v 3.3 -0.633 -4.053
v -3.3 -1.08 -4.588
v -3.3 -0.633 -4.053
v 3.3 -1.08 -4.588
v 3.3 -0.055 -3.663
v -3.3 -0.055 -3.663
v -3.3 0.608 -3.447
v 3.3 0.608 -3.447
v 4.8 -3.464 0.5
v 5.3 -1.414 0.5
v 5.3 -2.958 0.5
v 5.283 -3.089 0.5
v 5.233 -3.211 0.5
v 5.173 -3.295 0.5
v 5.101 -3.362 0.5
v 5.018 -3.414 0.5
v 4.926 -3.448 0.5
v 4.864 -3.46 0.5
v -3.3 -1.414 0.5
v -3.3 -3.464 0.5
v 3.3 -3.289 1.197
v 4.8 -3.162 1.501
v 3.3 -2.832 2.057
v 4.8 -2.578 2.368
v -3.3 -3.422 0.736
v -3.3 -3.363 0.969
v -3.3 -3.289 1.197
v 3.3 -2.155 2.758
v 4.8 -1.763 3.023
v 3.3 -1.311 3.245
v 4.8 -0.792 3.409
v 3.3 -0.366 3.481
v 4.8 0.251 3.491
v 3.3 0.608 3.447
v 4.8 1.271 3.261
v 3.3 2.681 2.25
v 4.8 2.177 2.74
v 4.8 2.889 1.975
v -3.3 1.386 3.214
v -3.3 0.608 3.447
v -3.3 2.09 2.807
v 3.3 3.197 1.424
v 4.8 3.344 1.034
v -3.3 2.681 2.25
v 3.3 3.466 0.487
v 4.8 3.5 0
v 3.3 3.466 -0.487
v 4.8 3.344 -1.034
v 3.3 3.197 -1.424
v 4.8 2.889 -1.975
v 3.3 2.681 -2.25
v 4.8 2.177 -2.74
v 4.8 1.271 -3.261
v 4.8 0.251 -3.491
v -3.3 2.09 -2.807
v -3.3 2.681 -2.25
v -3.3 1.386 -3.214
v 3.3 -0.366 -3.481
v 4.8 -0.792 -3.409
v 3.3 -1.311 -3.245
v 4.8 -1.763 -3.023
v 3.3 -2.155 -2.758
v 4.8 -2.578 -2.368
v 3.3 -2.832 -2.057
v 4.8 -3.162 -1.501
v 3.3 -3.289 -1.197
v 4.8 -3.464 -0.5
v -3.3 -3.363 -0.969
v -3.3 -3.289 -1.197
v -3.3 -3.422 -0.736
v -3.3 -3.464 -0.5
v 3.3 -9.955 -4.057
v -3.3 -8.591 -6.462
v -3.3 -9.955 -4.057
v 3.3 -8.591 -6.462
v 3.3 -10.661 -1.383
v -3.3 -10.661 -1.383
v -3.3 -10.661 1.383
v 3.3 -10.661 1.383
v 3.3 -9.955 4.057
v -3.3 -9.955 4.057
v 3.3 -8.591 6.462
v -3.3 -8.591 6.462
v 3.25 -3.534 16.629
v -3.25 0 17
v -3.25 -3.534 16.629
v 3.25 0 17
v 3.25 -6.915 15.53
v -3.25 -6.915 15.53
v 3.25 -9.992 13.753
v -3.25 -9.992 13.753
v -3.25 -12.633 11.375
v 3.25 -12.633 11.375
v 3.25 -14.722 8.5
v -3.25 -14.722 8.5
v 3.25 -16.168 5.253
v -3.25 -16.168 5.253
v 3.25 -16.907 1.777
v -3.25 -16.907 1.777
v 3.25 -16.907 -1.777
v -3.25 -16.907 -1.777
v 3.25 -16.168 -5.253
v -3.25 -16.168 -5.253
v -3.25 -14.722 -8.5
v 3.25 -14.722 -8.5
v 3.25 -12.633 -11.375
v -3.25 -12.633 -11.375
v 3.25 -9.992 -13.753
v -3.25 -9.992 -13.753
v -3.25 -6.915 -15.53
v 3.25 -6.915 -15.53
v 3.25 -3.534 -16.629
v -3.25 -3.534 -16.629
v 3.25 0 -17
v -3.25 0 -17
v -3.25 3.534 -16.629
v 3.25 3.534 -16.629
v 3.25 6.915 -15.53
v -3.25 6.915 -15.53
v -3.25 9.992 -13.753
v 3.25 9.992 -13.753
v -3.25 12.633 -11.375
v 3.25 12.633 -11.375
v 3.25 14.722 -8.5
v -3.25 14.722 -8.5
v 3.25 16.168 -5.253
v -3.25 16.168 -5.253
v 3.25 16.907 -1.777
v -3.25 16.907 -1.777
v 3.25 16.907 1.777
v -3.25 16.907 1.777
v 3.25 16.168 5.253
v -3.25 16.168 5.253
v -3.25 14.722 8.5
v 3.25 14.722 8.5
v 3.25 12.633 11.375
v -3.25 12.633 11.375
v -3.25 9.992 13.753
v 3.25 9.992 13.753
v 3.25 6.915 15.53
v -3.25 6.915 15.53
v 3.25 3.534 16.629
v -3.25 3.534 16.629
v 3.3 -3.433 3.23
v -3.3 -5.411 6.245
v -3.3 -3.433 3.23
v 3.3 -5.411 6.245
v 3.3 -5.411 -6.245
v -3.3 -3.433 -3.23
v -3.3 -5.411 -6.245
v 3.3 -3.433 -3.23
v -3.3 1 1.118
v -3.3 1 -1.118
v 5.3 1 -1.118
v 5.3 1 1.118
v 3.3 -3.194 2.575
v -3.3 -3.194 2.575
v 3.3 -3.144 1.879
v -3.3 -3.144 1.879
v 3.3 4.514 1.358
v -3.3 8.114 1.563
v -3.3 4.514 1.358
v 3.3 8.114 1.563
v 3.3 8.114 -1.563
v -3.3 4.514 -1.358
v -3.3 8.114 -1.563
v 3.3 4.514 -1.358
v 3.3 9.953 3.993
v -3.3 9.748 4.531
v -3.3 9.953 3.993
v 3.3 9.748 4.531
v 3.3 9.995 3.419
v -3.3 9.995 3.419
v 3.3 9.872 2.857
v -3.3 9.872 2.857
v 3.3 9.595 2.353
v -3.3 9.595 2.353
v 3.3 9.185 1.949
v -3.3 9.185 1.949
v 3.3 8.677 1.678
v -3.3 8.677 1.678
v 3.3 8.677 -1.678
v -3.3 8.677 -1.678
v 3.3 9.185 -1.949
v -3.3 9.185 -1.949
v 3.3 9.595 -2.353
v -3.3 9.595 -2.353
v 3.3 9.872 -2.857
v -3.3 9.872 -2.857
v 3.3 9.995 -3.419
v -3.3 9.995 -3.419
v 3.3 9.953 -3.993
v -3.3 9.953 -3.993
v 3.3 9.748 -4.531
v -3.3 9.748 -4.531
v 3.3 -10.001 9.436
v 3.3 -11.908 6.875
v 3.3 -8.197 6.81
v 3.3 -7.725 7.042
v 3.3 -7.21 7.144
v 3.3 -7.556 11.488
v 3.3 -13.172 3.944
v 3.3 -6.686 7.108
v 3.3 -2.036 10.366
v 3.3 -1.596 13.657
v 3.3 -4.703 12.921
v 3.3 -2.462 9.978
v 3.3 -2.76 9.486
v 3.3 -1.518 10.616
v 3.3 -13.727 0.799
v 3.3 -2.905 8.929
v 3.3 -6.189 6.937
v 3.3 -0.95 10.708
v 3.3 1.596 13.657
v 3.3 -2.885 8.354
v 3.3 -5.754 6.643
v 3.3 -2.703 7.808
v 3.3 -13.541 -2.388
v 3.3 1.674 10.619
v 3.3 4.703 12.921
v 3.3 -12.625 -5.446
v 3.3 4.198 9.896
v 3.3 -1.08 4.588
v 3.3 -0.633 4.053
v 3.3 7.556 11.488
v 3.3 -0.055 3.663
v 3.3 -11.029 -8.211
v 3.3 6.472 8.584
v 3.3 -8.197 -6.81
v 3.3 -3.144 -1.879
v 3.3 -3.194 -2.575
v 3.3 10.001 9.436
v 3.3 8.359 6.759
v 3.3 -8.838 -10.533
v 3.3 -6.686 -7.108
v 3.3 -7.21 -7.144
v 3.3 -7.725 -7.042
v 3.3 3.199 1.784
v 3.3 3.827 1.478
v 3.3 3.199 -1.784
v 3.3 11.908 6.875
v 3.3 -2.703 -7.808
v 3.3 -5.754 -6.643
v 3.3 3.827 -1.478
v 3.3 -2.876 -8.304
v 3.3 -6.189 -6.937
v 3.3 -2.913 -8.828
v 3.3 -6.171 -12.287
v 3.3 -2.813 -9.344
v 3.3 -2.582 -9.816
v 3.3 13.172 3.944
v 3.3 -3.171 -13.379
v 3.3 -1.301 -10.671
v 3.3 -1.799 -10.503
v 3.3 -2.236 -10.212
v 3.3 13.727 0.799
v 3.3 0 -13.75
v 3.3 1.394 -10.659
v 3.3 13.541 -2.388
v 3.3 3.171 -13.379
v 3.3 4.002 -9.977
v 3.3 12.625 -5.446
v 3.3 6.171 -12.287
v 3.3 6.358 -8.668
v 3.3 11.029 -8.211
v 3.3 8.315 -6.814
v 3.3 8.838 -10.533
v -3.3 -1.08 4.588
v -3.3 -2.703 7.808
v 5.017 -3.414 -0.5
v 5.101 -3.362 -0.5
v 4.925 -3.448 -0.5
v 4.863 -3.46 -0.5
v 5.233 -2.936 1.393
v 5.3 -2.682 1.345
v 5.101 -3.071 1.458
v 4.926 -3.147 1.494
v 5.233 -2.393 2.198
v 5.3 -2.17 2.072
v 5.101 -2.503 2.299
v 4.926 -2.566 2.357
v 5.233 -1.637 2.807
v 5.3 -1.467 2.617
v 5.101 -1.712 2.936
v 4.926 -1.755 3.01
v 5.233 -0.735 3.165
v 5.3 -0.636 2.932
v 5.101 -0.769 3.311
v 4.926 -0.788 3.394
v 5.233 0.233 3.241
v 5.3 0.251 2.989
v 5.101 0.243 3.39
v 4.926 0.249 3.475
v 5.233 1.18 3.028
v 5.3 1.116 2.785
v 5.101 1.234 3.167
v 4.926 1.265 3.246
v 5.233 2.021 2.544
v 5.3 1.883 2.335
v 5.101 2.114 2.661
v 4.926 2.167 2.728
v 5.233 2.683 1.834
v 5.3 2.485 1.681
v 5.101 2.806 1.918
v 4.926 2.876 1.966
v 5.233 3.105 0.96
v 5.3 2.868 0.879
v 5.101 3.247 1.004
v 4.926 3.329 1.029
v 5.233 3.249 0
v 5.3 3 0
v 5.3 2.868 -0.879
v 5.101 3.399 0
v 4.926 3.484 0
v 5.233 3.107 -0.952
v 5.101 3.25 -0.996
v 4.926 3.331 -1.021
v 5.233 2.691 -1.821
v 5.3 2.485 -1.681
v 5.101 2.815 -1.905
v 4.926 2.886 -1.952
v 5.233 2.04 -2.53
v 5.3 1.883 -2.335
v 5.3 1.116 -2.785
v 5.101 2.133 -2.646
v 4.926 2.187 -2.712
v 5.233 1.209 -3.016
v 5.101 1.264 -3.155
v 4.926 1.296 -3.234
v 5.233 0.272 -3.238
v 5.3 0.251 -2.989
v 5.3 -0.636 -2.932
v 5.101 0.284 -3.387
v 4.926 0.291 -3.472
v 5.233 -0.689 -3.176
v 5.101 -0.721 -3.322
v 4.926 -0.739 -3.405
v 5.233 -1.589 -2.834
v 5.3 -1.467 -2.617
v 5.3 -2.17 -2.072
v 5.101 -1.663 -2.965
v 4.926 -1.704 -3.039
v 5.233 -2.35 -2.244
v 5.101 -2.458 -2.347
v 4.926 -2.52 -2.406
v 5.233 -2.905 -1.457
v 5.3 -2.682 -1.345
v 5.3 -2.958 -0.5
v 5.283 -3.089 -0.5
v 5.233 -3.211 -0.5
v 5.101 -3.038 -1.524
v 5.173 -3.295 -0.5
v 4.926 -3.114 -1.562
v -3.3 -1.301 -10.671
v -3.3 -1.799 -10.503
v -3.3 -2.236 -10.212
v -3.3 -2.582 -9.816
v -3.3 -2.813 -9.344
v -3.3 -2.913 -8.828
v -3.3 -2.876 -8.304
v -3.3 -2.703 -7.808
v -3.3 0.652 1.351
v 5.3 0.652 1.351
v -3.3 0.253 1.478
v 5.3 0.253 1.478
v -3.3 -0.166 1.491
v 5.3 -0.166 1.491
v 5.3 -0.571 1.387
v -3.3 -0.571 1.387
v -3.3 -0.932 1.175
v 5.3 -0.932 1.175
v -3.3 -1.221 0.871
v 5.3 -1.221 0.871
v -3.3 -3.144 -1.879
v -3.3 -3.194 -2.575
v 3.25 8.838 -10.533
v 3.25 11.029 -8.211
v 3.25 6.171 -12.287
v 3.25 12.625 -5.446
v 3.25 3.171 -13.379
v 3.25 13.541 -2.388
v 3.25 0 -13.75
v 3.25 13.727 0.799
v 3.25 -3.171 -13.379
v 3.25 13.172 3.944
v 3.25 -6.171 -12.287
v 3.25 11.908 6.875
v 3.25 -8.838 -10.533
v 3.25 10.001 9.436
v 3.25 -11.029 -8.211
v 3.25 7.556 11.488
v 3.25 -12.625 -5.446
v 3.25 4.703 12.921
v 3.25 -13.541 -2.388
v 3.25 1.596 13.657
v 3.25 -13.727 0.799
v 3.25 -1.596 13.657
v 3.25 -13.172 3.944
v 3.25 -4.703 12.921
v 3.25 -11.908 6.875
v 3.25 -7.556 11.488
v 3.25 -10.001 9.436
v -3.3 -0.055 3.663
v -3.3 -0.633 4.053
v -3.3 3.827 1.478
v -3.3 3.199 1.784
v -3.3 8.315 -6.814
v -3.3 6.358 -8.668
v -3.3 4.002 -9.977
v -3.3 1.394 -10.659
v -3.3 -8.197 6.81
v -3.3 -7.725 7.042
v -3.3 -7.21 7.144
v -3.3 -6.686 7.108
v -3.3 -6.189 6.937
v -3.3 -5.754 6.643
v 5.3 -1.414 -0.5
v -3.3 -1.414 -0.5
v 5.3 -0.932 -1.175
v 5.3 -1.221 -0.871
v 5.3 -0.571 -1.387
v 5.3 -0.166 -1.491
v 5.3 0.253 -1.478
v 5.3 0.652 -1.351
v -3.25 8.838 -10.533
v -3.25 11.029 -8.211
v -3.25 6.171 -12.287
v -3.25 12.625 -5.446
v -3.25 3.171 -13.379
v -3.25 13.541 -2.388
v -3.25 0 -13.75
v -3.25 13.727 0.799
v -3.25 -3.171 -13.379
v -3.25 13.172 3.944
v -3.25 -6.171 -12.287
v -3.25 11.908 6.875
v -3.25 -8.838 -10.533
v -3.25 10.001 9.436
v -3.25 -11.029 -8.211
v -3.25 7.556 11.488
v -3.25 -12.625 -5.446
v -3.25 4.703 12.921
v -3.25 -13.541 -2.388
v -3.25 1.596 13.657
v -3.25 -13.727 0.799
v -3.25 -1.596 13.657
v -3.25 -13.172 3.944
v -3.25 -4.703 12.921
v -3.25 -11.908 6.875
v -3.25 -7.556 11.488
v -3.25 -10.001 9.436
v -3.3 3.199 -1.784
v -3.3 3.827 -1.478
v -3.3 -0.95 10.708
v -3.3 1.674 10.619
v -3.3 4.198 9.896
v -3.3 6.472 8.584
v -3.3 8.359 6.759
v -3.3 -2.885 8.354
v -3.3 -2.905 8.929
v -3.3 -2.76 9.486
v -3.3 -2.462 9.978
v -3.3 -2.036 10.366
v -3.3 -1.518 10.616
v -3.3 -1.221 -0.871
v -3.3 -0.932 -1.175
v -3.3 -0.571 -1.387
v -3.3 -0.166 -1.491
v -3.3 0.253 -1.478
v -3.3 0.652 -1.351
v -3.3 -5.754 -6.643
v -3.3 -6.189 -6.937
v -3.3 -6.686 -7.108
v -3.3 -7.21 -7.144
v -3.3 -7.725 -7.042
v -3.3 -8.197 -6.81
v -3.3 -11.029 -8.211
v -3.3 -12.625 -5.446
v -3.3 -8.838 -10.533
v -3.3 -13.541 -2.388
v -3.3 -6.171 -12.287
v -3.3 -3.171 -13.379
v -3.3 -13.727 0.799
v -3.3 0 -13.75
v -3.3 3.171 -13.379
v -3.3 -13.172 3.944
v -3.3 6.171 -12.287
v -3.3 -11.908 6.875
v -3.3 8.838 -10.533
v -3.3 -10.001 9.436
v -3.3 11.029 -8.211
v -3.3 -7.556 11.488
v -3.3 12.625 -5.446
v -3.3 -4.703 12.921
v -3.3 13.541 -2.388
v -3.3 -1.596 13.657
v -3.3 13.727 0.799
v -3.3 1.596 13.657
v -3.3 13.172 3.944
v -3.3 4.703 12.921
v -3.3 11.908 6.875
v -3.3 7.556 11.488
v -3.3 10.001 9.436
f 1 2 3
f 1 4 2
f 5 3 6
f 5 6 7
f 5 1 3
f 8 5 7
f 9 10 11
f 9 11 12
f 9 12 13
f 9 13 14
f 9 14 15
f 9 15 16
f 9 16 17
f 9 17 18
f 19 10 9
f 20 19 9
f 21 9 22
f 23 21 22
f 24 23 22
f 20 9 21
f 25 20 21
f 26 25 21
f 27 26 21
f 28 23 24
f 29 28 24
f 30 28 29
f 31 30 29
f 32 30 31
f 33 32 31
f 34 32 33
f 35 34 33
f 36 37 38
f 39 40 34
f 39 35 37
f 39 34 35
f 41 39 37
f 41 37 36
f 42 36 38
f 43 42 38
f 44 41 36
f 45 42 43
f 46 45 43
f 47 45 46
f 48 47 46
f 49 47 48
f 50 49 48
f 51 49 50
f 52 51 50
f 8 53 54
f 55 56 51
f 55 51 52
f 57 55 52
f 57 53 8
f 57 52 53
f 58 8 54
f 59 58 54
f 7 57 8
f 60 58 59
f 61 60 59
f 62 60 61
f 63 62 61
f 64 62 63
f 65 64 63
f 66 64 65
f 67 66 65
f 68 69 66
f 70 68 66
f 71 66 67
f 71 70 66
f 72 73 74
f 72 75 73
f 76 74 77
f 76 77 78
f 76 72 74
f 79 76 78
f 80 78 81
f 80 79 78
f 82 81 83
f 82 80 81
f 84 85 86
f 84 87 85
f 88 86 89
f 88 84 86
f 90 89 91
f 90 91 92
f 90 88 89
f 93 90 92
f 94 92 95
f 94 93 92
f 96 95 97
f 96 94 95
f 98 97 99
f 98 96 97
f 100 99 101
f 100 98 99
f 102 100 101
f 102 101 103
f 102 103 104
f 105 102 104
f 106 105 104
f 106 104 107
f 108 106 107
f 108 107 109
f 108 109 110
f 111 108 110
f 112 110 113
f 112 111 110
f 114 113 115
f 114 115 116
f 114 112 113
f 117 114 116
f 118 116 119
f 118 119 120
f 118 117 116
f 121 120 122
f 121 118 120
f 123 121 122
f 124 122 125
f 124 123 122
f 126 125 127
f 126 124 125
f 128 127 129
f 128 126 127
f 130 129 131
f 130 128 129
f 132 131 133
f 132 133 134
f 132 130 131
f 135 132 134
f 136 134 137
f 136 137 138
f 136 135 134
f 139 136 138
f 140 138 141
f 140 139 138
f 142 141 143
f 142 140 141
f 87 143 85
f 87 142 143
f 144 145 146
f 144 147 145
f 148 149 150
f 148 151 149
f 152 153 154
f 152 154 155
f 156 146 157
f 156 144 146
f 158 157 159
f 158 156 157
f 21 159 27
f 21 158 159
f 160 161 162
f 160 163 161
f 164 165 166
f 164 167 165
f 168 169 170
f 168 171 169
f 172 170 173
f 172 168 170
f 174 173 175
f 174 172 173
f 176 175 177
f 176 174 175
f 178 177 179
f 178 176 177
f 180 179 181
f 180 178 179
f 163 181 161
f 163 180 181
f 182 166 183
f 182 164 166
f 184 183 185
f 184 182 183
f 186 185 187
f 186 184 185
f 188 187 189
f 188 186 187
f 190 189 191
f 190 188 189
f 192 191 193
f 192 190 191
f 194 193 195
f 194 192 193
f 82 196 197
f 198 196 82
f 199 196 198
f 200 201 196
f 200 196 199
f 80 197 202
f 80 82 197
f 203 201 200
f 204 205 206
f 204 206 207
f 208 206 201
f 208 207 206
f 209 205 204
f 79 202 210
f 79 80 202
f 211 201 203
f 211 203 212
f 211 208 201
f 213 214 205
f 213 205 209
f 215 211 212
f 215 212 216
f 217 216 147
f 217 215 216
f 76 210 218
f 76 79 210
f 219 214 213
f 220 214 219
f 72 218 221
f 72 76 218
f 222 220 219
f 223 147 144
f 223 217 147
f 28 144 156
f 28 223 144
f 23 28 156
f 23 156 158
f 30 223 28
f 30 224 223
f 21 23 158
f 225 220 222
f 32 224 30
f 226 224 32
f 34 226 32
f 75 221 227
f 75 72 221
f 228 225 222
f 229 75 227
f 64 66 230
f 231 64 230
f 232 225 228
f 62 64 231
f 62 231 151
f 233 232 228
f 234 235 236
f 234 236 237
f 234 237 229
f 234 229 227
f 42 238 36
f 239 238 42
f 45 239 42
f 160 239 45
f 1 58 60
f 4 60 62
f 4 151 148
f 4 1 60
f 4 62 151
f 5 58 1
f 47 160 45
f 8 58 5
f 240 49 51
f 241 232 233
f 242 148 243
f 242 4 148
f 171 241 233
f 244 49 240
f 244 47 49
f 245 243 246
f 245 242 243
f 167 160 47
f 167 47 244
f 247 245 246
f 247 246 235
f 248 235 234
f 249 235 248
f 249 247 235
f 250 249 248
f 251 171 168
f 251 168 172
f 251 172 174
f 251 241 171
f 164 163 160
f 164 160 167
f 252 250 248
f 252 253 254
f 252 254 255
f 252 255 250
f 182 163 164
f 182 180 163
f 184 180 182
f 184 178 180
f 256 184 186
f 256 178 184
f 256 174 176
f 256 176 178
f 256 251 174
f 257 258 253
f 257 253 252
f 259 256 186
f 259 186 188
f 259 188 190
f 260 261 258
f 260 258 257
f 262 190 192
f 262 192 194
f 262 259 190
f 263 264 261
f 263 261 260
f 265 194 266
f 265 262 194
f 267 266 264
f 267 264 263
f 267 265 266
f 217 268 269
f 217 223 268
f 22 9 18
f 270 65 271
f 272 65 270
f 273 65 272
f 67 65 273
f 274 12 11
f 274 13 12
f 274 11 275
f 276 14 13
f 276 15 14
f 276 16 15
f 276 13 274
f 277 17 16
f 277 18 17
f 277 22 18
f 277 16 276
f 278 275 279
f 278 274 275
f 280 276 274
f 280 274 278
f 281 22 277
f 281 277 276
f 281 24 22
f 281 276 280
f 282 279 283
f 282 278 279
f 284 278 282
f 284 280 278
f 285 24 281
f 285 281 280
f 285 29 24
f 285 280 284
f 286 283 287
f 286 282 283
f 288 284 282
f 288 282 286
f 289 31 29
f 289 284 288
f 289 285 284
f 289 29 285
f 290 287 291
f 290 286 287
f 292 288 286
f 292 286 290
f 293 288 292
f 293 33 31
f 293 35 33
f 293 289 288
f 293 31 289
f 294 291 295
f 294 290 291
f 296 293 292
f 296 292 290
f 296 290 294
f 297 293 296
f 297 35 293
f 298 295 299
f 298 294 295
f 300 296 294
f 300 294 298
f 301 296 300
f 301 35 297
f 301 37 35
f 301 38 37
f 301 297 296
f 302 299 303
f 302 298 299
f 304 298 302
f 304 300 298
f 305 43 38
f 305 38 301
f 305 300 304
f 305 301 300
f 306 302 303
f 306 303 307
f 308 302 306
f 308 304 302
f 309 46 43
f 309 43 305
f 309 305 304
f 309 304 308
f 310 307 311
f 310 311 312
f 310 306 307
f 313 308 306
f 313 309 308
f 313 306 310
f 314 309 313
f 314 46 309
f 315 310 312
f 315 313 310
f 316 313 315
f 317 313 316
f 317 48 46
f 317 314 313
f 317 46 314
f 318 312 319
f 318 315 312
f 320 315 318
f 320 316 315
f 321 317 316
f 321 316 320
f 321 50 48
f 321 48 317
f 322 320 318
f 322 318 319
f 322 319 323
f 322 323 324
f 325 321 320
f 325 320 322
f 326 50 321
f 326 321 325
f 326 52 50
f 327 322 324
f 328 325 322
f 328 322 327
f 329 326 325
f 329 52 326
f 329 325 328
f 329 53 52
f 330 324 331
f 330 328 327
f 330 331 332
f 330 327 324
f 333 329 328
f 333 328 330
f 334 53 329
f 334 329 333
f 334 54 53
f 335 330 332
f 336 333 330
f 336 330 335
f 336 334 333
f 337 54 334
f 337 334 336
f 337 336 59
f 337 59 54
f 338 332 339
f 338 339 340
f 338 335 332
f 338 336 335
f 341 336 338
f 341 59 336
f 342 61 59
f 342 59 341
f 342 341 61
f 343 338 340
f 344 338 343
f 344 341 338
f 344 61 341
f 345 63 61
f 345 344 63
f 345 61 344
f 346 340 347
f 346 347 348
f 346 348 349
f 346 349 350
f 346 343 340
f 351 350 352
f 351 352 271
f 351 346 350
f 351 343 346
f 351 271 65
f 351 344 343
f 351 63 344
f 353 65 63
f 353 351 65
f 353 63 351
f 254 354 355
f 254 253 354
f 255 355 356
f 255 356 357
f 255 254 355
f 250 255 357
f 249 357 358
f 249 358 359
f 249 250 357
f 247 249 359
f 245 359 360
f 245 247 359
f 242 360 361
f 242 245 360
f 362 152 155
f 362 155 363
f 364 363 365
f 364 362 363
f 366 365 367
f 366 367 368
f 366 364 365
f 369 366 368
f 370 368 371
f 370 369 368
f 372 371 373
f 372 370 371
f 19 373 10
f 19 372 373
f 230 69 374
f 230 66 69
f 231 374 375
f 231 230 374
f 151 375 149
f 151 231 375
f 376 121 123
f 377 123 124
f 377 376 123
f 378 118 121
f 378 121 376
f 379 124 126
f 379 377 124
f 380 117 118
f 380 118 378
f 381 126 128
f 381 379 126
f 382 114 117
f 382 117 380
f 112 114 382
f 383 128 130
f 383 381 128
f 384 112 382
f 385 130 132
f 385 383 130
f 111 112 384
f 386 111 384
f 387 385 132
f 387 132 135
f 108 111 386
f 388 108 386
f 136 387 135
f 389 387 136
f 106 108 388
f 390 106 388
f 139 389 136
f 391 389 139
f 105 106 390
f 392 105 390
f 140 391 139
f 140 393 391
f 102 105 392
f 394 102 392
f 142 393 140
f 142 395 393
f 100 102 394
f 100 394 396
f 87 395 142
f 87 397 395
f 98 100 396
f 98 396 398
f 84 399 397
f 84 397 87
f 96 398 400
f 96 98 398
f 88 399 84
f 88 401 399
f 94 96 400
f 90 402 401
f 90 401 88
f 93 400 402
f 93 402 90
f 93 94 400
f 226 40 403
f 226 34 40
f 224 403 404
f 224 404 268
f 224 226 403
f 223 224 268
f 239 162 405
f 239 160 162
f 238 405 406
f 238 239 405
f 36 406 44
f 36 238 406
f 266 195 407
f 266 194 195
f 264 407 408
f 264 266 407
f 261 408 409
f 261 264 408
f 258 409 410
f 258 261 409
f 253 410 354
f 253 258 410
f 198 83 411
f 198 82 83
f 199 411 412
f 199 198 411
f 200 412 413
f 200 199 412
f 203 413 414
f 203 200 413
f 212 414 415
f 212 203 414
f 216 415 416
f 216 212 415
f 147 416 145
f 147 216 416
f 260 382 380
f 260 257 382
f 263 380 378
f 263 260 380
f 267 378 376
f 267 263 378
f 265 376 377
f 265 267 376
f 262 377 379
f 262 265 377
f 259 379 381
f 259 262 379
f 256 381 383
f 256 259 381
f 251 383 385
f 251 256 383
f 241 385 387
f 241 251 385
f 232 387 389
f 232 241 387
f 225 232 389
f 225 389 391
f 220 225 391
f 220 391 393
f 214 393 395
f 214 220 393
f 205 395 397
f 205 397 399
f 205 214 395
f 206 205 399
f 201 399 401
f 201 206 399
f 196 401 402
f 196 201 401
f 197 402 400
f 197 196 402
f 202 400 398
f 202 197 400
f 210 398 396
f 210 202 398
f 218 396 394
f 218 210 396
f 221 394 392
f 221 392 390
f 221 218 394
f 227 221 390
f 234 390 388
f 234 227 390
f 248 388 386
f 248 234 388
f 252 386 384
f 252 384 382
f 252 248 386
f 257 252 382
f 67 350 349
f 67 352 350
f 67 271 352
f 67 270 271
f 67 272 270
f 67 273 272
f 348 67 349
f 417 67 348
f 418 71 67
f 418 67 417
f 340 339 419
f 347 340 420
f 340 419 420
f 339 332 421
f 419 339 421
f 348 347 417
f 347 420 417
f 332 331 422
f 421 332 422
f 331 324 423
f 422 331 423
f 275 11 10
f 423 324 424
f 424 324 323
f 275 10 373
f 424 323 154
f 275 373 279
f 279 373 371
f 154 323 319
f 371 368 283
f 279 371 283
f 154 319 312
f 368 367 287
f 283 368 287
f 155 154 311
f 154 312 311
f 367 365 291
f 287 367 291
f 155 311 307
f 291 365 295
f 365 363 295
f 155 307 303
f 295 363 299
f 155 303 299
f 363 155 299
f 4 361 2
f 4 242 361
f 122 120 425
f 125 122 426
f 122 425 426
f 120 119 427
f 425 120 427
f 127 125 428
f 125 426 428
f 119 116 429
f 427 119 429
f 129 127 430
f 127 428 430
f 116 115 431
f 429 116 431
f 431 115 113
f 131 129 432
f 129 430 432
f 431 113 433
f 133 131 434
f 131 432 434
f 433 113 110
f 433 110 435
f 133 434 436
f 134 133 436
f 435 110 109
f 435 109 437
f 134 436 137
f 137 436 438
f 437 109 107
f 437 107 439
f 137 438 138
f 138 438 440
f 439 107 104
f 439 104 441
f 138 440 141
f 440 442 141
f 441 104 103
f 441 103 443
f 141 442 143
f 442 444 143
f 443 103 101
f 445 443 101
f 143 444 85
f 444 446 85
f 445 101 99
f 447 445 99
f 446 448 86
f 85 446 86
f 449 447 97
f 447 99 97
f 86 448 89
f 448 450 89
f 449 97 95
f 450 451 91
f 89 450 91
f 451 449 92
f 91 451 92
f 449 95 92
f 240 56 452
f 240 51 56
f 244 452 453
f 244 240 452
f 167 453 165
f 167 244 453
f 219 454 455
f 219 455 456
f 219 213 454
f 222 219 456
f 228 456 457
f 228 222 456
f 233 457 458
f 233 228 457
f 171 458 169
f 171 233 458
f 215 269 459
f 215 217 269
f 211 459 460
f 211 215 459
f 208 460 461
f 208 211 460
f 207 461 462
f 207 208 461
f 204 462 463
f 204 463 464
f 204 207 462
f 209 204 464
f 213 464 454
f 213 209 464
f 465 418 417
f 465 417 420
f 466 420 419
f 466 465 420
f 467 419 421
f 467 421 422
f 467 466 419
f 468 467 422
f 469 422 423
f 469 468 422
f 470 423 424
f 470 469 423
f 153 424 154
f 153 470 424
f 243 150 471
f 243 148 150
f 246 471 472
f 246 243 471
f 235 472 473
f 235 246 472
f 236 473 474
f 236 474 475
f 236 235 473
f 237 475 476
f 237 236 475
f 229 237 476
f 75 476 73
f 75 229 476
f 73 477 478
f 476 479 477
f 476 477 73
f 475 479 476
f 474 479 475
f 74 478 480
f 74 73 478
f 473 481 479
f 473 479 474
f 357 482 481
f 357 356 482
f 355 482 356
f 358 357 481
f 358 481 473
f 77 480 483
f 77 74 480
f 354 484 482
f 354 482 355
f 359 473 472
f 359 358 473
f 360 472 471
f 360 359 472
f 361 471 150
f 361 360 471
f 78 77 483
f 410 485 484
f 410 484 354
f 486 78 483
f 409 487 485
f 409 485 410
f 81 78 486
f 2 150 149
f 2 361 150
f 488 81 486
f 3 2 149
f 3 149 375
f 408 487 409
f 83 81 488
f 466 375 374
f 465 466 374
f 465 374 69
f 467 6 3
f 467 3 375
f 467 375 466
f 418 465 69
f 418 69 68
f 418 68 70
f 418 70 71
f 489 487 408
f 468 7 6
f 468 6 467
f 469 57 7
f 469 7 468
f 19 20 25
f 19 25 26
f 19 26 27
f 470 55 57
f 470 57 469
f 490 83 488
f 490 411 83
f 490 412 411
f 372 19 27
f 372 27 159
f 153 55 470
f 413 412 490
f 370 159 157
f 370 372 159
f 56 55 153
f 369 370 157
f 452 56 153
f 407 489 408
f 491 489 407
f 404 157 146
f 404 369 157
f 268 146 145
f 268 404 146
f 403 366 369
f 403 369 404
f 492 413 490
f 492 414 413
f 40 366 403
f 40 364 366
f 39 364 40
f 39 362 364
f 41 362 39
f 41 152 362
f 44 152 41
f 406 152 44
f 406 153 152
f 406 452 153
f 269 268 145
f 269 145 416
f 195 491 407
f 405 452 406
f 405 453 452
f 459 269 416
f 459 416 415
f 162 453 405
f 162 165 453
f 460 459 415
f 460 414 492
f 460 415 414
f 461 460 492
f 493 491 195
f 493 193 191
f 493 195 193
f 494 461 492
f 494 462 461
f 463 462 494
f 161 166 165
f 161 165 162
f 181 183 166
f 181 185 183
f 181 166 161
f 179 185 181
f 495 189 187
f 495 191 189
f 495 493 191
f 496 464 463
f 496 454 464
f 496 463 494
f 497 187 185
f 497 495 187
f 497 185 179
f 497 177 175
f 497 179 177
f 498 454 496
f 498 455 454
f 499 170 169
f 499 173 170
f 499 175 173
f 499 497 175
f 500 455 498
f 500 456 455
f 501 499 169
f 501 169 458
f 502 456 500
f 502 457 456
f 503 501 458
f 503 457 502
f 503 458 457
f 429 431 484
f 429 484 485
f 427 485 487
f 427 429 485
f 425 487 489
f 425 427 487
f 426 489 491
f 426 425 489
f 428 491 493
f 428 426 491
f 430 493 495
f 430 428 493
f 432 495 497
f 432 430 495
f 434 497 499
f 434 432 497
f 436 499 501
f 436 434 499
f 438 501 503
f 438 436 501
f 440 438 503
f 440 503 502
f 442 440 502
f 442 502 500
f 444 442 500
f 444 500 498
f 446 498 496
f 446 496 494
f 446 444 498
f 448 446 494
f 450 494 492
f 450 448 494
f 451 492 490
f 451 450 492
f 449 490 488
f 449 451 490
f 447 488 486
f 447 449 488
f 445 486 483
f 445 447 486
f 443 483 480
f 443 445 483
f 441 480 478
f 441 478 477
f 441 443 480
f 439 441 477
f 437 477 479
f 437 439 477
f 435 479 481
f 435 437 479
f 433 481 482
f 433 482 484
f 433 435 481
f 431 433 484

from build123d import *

# Parameters (mm, degrees)
RESSALTO_EXTRUS_O1_DEPTH      = 5.3
RESSALTO_EXTRUS_O1_DEPTH_BACK = 3.3
ESBO_O1_3_R                   = 13.75
RESSALTO_EXTRUS_O2_DEPTH      = 3.3
FILETE2_R                     = 0.5
ESBO_O2_R                     = 17
ESBO_O2_R_2                   = 13.75
RESSALTO_EXTRUS_O3_DEPTH      = 3.25


with BuildPart() as part:
    # Esboço1 → Ressalto-extrusão1 (new, two sides: drawn at the far end of the back side and taken through both)
    with BuildSketch(Plane(origin=(0, 0, 0), x_dir=(0, 0, -1), z_dir=(1, 0, 0)).offset(-RESSALTO_EXTRUS_O1_DEPTH_BACK)):
        with BuildLine():
            ThreePointArc((0.5, -1.414213562), (1.4531398, -0.37200097), (1.118033989, 1))
            Line((1.118033989, 1), (-1.118033989, 1))
            ThreePointArc((-1.118033989, 1), (-1.4531398, -0.37200097), (-0.5, -1.414213562))
            Line((-0.5, -1.414213562), (-0.5, -3.464101615))
            ThreePointArc((-0.5, -3.464101615), (0, 3.5), (0.5, -3.464101615))
            Line((0.5, -3.464101615), (0.5, -1.414213562))
        make_face()
    extrude(amount=RESSALTO_EXTRUS_O1_DEPTH + RESSALTO_EXTRUS_O1_DEPTH_BACK)

    # Esboço1<3> → Ressalto-extrusão2 (add, symmetric)
    with BuildSketch(Plane(origin=(0, 0, 0), x_dir=(0, 0, -1), z_dir=(1, 0, 0))):
        Circle(ESBO_O1_3_R)
        with BuildLine():
            ThreePointArc((3.446771953, 0.608081497), (3.031088913, -1.75), (1.196771953, -3.28903282))
            ThreePointArc((1.196771953, -3.28903282), (2.228560776, -3.144612223), (3.229618168, -3.433280857))
            Line((3.229618168, -3.433280857), (6.244929793, -5.410607922))
            ThreePointArc((6.244929793, -5.410607922), (7.143531761, -6.946693722), (6.462297299, -8.590763273))
            ThreePointArc((6.462297299, -8.590763273), (0, -10.75), (-6.462297299, -8.590763273))
            ThreePointArc((-6.462297299, -8.590763273), (-7.143531761, -6.946693722), (-6.244929793, -5.410607922))
            Line((-6.244929793, -5.410607922), (-3.229618168, -3.433280857))
            ThreePointArc((-3.229618168, -3.433280857), (-2.228560776, -3.144612223), (-1.196771953, -3.28903282))
            ThreePointArc((-1.196771953, -3.28903282), (-3.031088913, -1.75), (-3.446771953, 0.608081497))
            ThreePointArc((-3.446771953, 0.608081497), (-3.837594458, -0.357684134), (-4.588117525, -1.08029095))
            Line((-4.588117525, -1.08029095), (-7.808188807, -2.702963885))
            ThreePointArc((-7.808188807, -2.702963885), (-9.742921821, -2.628468224), (-10.707946608, -0.949936544))
            ThreePointArc((-10.707946608, -0.949936544), (-9.309773091, 5.375), (-4.531304125, 9.748322057))
            ThreePointArc((-4.531304125, 9.748322057), (-2.595140656, 9.751851916), (-1.563259014, 8.113571807))
            Line((-1.563259014, 8.113571807), (-1.358499357, 4.513571807))
            ThreePointArc((-1.358499357, 4.513571807), (-1.609033682, 3.502296357), (-2.25, 2.680951324))
            ThreePointArc((-2.25, 2.680951324), (0, 3.5), (2.25, 2.680951324))
            ThreePointArc((2.25, 2.680951324), (1.609033682, 3.502296357), (1.358499357, 4.513571807))
            Line((1.358499357, 4.513571807), (1.563259014, 8.113571807))
            ThreePointArc((1.563259014, 8.113571807), (2.595140656, 9.751851916), (4.531304125, 9.748322057))
            ThreePointArc((4.531304125, 9.748322057), (9.396801436, 5.221362156), (10.670967882, -1.301131991))
            ThreePointArc((10.670967882, -1.301131991), (9.587779116, -2.713133117), (7.808188807, -2.702963885))
            Line((7.808188807, -2.702963885), (4.588117525, -1.08029095))
            ThreePointArc((4.588117525, -1.08029095), (3.837594458, -0.357684134), (3.446771953, 0.608081497))
        make_face(mode=Mode.SUBTRACT)
    extrude(amount=RESSALTO_EXTRUS_O2_DEPTH, both=True)

    # Filete2
    filete2_edges = [part.edges().sort_by_distance(p)[0] for p in [
        (5.3, 3.5, 0),
    ]]
    fillet(filete2_edges, radius=FILETE2_R)

    # Esboço2 → Ressalto-extrusão3 (add, symmetric)
    with BuildSketch(Plane(origin=(0, 0, 0), x_dir=(0, 0, -1), z_dir=(1, 0, 0))):
        with Locations(Location((0, 0, 0), (0, 0, 180))):
            Circle(ESBO_O2_R)
        Circle(ESBO_O2_R_2, mode=Mode.SUBTRACT)
    extrude(amount=RESSALTO_EXTRUS_O3_DEPTH, both=True)


solid = part.part
